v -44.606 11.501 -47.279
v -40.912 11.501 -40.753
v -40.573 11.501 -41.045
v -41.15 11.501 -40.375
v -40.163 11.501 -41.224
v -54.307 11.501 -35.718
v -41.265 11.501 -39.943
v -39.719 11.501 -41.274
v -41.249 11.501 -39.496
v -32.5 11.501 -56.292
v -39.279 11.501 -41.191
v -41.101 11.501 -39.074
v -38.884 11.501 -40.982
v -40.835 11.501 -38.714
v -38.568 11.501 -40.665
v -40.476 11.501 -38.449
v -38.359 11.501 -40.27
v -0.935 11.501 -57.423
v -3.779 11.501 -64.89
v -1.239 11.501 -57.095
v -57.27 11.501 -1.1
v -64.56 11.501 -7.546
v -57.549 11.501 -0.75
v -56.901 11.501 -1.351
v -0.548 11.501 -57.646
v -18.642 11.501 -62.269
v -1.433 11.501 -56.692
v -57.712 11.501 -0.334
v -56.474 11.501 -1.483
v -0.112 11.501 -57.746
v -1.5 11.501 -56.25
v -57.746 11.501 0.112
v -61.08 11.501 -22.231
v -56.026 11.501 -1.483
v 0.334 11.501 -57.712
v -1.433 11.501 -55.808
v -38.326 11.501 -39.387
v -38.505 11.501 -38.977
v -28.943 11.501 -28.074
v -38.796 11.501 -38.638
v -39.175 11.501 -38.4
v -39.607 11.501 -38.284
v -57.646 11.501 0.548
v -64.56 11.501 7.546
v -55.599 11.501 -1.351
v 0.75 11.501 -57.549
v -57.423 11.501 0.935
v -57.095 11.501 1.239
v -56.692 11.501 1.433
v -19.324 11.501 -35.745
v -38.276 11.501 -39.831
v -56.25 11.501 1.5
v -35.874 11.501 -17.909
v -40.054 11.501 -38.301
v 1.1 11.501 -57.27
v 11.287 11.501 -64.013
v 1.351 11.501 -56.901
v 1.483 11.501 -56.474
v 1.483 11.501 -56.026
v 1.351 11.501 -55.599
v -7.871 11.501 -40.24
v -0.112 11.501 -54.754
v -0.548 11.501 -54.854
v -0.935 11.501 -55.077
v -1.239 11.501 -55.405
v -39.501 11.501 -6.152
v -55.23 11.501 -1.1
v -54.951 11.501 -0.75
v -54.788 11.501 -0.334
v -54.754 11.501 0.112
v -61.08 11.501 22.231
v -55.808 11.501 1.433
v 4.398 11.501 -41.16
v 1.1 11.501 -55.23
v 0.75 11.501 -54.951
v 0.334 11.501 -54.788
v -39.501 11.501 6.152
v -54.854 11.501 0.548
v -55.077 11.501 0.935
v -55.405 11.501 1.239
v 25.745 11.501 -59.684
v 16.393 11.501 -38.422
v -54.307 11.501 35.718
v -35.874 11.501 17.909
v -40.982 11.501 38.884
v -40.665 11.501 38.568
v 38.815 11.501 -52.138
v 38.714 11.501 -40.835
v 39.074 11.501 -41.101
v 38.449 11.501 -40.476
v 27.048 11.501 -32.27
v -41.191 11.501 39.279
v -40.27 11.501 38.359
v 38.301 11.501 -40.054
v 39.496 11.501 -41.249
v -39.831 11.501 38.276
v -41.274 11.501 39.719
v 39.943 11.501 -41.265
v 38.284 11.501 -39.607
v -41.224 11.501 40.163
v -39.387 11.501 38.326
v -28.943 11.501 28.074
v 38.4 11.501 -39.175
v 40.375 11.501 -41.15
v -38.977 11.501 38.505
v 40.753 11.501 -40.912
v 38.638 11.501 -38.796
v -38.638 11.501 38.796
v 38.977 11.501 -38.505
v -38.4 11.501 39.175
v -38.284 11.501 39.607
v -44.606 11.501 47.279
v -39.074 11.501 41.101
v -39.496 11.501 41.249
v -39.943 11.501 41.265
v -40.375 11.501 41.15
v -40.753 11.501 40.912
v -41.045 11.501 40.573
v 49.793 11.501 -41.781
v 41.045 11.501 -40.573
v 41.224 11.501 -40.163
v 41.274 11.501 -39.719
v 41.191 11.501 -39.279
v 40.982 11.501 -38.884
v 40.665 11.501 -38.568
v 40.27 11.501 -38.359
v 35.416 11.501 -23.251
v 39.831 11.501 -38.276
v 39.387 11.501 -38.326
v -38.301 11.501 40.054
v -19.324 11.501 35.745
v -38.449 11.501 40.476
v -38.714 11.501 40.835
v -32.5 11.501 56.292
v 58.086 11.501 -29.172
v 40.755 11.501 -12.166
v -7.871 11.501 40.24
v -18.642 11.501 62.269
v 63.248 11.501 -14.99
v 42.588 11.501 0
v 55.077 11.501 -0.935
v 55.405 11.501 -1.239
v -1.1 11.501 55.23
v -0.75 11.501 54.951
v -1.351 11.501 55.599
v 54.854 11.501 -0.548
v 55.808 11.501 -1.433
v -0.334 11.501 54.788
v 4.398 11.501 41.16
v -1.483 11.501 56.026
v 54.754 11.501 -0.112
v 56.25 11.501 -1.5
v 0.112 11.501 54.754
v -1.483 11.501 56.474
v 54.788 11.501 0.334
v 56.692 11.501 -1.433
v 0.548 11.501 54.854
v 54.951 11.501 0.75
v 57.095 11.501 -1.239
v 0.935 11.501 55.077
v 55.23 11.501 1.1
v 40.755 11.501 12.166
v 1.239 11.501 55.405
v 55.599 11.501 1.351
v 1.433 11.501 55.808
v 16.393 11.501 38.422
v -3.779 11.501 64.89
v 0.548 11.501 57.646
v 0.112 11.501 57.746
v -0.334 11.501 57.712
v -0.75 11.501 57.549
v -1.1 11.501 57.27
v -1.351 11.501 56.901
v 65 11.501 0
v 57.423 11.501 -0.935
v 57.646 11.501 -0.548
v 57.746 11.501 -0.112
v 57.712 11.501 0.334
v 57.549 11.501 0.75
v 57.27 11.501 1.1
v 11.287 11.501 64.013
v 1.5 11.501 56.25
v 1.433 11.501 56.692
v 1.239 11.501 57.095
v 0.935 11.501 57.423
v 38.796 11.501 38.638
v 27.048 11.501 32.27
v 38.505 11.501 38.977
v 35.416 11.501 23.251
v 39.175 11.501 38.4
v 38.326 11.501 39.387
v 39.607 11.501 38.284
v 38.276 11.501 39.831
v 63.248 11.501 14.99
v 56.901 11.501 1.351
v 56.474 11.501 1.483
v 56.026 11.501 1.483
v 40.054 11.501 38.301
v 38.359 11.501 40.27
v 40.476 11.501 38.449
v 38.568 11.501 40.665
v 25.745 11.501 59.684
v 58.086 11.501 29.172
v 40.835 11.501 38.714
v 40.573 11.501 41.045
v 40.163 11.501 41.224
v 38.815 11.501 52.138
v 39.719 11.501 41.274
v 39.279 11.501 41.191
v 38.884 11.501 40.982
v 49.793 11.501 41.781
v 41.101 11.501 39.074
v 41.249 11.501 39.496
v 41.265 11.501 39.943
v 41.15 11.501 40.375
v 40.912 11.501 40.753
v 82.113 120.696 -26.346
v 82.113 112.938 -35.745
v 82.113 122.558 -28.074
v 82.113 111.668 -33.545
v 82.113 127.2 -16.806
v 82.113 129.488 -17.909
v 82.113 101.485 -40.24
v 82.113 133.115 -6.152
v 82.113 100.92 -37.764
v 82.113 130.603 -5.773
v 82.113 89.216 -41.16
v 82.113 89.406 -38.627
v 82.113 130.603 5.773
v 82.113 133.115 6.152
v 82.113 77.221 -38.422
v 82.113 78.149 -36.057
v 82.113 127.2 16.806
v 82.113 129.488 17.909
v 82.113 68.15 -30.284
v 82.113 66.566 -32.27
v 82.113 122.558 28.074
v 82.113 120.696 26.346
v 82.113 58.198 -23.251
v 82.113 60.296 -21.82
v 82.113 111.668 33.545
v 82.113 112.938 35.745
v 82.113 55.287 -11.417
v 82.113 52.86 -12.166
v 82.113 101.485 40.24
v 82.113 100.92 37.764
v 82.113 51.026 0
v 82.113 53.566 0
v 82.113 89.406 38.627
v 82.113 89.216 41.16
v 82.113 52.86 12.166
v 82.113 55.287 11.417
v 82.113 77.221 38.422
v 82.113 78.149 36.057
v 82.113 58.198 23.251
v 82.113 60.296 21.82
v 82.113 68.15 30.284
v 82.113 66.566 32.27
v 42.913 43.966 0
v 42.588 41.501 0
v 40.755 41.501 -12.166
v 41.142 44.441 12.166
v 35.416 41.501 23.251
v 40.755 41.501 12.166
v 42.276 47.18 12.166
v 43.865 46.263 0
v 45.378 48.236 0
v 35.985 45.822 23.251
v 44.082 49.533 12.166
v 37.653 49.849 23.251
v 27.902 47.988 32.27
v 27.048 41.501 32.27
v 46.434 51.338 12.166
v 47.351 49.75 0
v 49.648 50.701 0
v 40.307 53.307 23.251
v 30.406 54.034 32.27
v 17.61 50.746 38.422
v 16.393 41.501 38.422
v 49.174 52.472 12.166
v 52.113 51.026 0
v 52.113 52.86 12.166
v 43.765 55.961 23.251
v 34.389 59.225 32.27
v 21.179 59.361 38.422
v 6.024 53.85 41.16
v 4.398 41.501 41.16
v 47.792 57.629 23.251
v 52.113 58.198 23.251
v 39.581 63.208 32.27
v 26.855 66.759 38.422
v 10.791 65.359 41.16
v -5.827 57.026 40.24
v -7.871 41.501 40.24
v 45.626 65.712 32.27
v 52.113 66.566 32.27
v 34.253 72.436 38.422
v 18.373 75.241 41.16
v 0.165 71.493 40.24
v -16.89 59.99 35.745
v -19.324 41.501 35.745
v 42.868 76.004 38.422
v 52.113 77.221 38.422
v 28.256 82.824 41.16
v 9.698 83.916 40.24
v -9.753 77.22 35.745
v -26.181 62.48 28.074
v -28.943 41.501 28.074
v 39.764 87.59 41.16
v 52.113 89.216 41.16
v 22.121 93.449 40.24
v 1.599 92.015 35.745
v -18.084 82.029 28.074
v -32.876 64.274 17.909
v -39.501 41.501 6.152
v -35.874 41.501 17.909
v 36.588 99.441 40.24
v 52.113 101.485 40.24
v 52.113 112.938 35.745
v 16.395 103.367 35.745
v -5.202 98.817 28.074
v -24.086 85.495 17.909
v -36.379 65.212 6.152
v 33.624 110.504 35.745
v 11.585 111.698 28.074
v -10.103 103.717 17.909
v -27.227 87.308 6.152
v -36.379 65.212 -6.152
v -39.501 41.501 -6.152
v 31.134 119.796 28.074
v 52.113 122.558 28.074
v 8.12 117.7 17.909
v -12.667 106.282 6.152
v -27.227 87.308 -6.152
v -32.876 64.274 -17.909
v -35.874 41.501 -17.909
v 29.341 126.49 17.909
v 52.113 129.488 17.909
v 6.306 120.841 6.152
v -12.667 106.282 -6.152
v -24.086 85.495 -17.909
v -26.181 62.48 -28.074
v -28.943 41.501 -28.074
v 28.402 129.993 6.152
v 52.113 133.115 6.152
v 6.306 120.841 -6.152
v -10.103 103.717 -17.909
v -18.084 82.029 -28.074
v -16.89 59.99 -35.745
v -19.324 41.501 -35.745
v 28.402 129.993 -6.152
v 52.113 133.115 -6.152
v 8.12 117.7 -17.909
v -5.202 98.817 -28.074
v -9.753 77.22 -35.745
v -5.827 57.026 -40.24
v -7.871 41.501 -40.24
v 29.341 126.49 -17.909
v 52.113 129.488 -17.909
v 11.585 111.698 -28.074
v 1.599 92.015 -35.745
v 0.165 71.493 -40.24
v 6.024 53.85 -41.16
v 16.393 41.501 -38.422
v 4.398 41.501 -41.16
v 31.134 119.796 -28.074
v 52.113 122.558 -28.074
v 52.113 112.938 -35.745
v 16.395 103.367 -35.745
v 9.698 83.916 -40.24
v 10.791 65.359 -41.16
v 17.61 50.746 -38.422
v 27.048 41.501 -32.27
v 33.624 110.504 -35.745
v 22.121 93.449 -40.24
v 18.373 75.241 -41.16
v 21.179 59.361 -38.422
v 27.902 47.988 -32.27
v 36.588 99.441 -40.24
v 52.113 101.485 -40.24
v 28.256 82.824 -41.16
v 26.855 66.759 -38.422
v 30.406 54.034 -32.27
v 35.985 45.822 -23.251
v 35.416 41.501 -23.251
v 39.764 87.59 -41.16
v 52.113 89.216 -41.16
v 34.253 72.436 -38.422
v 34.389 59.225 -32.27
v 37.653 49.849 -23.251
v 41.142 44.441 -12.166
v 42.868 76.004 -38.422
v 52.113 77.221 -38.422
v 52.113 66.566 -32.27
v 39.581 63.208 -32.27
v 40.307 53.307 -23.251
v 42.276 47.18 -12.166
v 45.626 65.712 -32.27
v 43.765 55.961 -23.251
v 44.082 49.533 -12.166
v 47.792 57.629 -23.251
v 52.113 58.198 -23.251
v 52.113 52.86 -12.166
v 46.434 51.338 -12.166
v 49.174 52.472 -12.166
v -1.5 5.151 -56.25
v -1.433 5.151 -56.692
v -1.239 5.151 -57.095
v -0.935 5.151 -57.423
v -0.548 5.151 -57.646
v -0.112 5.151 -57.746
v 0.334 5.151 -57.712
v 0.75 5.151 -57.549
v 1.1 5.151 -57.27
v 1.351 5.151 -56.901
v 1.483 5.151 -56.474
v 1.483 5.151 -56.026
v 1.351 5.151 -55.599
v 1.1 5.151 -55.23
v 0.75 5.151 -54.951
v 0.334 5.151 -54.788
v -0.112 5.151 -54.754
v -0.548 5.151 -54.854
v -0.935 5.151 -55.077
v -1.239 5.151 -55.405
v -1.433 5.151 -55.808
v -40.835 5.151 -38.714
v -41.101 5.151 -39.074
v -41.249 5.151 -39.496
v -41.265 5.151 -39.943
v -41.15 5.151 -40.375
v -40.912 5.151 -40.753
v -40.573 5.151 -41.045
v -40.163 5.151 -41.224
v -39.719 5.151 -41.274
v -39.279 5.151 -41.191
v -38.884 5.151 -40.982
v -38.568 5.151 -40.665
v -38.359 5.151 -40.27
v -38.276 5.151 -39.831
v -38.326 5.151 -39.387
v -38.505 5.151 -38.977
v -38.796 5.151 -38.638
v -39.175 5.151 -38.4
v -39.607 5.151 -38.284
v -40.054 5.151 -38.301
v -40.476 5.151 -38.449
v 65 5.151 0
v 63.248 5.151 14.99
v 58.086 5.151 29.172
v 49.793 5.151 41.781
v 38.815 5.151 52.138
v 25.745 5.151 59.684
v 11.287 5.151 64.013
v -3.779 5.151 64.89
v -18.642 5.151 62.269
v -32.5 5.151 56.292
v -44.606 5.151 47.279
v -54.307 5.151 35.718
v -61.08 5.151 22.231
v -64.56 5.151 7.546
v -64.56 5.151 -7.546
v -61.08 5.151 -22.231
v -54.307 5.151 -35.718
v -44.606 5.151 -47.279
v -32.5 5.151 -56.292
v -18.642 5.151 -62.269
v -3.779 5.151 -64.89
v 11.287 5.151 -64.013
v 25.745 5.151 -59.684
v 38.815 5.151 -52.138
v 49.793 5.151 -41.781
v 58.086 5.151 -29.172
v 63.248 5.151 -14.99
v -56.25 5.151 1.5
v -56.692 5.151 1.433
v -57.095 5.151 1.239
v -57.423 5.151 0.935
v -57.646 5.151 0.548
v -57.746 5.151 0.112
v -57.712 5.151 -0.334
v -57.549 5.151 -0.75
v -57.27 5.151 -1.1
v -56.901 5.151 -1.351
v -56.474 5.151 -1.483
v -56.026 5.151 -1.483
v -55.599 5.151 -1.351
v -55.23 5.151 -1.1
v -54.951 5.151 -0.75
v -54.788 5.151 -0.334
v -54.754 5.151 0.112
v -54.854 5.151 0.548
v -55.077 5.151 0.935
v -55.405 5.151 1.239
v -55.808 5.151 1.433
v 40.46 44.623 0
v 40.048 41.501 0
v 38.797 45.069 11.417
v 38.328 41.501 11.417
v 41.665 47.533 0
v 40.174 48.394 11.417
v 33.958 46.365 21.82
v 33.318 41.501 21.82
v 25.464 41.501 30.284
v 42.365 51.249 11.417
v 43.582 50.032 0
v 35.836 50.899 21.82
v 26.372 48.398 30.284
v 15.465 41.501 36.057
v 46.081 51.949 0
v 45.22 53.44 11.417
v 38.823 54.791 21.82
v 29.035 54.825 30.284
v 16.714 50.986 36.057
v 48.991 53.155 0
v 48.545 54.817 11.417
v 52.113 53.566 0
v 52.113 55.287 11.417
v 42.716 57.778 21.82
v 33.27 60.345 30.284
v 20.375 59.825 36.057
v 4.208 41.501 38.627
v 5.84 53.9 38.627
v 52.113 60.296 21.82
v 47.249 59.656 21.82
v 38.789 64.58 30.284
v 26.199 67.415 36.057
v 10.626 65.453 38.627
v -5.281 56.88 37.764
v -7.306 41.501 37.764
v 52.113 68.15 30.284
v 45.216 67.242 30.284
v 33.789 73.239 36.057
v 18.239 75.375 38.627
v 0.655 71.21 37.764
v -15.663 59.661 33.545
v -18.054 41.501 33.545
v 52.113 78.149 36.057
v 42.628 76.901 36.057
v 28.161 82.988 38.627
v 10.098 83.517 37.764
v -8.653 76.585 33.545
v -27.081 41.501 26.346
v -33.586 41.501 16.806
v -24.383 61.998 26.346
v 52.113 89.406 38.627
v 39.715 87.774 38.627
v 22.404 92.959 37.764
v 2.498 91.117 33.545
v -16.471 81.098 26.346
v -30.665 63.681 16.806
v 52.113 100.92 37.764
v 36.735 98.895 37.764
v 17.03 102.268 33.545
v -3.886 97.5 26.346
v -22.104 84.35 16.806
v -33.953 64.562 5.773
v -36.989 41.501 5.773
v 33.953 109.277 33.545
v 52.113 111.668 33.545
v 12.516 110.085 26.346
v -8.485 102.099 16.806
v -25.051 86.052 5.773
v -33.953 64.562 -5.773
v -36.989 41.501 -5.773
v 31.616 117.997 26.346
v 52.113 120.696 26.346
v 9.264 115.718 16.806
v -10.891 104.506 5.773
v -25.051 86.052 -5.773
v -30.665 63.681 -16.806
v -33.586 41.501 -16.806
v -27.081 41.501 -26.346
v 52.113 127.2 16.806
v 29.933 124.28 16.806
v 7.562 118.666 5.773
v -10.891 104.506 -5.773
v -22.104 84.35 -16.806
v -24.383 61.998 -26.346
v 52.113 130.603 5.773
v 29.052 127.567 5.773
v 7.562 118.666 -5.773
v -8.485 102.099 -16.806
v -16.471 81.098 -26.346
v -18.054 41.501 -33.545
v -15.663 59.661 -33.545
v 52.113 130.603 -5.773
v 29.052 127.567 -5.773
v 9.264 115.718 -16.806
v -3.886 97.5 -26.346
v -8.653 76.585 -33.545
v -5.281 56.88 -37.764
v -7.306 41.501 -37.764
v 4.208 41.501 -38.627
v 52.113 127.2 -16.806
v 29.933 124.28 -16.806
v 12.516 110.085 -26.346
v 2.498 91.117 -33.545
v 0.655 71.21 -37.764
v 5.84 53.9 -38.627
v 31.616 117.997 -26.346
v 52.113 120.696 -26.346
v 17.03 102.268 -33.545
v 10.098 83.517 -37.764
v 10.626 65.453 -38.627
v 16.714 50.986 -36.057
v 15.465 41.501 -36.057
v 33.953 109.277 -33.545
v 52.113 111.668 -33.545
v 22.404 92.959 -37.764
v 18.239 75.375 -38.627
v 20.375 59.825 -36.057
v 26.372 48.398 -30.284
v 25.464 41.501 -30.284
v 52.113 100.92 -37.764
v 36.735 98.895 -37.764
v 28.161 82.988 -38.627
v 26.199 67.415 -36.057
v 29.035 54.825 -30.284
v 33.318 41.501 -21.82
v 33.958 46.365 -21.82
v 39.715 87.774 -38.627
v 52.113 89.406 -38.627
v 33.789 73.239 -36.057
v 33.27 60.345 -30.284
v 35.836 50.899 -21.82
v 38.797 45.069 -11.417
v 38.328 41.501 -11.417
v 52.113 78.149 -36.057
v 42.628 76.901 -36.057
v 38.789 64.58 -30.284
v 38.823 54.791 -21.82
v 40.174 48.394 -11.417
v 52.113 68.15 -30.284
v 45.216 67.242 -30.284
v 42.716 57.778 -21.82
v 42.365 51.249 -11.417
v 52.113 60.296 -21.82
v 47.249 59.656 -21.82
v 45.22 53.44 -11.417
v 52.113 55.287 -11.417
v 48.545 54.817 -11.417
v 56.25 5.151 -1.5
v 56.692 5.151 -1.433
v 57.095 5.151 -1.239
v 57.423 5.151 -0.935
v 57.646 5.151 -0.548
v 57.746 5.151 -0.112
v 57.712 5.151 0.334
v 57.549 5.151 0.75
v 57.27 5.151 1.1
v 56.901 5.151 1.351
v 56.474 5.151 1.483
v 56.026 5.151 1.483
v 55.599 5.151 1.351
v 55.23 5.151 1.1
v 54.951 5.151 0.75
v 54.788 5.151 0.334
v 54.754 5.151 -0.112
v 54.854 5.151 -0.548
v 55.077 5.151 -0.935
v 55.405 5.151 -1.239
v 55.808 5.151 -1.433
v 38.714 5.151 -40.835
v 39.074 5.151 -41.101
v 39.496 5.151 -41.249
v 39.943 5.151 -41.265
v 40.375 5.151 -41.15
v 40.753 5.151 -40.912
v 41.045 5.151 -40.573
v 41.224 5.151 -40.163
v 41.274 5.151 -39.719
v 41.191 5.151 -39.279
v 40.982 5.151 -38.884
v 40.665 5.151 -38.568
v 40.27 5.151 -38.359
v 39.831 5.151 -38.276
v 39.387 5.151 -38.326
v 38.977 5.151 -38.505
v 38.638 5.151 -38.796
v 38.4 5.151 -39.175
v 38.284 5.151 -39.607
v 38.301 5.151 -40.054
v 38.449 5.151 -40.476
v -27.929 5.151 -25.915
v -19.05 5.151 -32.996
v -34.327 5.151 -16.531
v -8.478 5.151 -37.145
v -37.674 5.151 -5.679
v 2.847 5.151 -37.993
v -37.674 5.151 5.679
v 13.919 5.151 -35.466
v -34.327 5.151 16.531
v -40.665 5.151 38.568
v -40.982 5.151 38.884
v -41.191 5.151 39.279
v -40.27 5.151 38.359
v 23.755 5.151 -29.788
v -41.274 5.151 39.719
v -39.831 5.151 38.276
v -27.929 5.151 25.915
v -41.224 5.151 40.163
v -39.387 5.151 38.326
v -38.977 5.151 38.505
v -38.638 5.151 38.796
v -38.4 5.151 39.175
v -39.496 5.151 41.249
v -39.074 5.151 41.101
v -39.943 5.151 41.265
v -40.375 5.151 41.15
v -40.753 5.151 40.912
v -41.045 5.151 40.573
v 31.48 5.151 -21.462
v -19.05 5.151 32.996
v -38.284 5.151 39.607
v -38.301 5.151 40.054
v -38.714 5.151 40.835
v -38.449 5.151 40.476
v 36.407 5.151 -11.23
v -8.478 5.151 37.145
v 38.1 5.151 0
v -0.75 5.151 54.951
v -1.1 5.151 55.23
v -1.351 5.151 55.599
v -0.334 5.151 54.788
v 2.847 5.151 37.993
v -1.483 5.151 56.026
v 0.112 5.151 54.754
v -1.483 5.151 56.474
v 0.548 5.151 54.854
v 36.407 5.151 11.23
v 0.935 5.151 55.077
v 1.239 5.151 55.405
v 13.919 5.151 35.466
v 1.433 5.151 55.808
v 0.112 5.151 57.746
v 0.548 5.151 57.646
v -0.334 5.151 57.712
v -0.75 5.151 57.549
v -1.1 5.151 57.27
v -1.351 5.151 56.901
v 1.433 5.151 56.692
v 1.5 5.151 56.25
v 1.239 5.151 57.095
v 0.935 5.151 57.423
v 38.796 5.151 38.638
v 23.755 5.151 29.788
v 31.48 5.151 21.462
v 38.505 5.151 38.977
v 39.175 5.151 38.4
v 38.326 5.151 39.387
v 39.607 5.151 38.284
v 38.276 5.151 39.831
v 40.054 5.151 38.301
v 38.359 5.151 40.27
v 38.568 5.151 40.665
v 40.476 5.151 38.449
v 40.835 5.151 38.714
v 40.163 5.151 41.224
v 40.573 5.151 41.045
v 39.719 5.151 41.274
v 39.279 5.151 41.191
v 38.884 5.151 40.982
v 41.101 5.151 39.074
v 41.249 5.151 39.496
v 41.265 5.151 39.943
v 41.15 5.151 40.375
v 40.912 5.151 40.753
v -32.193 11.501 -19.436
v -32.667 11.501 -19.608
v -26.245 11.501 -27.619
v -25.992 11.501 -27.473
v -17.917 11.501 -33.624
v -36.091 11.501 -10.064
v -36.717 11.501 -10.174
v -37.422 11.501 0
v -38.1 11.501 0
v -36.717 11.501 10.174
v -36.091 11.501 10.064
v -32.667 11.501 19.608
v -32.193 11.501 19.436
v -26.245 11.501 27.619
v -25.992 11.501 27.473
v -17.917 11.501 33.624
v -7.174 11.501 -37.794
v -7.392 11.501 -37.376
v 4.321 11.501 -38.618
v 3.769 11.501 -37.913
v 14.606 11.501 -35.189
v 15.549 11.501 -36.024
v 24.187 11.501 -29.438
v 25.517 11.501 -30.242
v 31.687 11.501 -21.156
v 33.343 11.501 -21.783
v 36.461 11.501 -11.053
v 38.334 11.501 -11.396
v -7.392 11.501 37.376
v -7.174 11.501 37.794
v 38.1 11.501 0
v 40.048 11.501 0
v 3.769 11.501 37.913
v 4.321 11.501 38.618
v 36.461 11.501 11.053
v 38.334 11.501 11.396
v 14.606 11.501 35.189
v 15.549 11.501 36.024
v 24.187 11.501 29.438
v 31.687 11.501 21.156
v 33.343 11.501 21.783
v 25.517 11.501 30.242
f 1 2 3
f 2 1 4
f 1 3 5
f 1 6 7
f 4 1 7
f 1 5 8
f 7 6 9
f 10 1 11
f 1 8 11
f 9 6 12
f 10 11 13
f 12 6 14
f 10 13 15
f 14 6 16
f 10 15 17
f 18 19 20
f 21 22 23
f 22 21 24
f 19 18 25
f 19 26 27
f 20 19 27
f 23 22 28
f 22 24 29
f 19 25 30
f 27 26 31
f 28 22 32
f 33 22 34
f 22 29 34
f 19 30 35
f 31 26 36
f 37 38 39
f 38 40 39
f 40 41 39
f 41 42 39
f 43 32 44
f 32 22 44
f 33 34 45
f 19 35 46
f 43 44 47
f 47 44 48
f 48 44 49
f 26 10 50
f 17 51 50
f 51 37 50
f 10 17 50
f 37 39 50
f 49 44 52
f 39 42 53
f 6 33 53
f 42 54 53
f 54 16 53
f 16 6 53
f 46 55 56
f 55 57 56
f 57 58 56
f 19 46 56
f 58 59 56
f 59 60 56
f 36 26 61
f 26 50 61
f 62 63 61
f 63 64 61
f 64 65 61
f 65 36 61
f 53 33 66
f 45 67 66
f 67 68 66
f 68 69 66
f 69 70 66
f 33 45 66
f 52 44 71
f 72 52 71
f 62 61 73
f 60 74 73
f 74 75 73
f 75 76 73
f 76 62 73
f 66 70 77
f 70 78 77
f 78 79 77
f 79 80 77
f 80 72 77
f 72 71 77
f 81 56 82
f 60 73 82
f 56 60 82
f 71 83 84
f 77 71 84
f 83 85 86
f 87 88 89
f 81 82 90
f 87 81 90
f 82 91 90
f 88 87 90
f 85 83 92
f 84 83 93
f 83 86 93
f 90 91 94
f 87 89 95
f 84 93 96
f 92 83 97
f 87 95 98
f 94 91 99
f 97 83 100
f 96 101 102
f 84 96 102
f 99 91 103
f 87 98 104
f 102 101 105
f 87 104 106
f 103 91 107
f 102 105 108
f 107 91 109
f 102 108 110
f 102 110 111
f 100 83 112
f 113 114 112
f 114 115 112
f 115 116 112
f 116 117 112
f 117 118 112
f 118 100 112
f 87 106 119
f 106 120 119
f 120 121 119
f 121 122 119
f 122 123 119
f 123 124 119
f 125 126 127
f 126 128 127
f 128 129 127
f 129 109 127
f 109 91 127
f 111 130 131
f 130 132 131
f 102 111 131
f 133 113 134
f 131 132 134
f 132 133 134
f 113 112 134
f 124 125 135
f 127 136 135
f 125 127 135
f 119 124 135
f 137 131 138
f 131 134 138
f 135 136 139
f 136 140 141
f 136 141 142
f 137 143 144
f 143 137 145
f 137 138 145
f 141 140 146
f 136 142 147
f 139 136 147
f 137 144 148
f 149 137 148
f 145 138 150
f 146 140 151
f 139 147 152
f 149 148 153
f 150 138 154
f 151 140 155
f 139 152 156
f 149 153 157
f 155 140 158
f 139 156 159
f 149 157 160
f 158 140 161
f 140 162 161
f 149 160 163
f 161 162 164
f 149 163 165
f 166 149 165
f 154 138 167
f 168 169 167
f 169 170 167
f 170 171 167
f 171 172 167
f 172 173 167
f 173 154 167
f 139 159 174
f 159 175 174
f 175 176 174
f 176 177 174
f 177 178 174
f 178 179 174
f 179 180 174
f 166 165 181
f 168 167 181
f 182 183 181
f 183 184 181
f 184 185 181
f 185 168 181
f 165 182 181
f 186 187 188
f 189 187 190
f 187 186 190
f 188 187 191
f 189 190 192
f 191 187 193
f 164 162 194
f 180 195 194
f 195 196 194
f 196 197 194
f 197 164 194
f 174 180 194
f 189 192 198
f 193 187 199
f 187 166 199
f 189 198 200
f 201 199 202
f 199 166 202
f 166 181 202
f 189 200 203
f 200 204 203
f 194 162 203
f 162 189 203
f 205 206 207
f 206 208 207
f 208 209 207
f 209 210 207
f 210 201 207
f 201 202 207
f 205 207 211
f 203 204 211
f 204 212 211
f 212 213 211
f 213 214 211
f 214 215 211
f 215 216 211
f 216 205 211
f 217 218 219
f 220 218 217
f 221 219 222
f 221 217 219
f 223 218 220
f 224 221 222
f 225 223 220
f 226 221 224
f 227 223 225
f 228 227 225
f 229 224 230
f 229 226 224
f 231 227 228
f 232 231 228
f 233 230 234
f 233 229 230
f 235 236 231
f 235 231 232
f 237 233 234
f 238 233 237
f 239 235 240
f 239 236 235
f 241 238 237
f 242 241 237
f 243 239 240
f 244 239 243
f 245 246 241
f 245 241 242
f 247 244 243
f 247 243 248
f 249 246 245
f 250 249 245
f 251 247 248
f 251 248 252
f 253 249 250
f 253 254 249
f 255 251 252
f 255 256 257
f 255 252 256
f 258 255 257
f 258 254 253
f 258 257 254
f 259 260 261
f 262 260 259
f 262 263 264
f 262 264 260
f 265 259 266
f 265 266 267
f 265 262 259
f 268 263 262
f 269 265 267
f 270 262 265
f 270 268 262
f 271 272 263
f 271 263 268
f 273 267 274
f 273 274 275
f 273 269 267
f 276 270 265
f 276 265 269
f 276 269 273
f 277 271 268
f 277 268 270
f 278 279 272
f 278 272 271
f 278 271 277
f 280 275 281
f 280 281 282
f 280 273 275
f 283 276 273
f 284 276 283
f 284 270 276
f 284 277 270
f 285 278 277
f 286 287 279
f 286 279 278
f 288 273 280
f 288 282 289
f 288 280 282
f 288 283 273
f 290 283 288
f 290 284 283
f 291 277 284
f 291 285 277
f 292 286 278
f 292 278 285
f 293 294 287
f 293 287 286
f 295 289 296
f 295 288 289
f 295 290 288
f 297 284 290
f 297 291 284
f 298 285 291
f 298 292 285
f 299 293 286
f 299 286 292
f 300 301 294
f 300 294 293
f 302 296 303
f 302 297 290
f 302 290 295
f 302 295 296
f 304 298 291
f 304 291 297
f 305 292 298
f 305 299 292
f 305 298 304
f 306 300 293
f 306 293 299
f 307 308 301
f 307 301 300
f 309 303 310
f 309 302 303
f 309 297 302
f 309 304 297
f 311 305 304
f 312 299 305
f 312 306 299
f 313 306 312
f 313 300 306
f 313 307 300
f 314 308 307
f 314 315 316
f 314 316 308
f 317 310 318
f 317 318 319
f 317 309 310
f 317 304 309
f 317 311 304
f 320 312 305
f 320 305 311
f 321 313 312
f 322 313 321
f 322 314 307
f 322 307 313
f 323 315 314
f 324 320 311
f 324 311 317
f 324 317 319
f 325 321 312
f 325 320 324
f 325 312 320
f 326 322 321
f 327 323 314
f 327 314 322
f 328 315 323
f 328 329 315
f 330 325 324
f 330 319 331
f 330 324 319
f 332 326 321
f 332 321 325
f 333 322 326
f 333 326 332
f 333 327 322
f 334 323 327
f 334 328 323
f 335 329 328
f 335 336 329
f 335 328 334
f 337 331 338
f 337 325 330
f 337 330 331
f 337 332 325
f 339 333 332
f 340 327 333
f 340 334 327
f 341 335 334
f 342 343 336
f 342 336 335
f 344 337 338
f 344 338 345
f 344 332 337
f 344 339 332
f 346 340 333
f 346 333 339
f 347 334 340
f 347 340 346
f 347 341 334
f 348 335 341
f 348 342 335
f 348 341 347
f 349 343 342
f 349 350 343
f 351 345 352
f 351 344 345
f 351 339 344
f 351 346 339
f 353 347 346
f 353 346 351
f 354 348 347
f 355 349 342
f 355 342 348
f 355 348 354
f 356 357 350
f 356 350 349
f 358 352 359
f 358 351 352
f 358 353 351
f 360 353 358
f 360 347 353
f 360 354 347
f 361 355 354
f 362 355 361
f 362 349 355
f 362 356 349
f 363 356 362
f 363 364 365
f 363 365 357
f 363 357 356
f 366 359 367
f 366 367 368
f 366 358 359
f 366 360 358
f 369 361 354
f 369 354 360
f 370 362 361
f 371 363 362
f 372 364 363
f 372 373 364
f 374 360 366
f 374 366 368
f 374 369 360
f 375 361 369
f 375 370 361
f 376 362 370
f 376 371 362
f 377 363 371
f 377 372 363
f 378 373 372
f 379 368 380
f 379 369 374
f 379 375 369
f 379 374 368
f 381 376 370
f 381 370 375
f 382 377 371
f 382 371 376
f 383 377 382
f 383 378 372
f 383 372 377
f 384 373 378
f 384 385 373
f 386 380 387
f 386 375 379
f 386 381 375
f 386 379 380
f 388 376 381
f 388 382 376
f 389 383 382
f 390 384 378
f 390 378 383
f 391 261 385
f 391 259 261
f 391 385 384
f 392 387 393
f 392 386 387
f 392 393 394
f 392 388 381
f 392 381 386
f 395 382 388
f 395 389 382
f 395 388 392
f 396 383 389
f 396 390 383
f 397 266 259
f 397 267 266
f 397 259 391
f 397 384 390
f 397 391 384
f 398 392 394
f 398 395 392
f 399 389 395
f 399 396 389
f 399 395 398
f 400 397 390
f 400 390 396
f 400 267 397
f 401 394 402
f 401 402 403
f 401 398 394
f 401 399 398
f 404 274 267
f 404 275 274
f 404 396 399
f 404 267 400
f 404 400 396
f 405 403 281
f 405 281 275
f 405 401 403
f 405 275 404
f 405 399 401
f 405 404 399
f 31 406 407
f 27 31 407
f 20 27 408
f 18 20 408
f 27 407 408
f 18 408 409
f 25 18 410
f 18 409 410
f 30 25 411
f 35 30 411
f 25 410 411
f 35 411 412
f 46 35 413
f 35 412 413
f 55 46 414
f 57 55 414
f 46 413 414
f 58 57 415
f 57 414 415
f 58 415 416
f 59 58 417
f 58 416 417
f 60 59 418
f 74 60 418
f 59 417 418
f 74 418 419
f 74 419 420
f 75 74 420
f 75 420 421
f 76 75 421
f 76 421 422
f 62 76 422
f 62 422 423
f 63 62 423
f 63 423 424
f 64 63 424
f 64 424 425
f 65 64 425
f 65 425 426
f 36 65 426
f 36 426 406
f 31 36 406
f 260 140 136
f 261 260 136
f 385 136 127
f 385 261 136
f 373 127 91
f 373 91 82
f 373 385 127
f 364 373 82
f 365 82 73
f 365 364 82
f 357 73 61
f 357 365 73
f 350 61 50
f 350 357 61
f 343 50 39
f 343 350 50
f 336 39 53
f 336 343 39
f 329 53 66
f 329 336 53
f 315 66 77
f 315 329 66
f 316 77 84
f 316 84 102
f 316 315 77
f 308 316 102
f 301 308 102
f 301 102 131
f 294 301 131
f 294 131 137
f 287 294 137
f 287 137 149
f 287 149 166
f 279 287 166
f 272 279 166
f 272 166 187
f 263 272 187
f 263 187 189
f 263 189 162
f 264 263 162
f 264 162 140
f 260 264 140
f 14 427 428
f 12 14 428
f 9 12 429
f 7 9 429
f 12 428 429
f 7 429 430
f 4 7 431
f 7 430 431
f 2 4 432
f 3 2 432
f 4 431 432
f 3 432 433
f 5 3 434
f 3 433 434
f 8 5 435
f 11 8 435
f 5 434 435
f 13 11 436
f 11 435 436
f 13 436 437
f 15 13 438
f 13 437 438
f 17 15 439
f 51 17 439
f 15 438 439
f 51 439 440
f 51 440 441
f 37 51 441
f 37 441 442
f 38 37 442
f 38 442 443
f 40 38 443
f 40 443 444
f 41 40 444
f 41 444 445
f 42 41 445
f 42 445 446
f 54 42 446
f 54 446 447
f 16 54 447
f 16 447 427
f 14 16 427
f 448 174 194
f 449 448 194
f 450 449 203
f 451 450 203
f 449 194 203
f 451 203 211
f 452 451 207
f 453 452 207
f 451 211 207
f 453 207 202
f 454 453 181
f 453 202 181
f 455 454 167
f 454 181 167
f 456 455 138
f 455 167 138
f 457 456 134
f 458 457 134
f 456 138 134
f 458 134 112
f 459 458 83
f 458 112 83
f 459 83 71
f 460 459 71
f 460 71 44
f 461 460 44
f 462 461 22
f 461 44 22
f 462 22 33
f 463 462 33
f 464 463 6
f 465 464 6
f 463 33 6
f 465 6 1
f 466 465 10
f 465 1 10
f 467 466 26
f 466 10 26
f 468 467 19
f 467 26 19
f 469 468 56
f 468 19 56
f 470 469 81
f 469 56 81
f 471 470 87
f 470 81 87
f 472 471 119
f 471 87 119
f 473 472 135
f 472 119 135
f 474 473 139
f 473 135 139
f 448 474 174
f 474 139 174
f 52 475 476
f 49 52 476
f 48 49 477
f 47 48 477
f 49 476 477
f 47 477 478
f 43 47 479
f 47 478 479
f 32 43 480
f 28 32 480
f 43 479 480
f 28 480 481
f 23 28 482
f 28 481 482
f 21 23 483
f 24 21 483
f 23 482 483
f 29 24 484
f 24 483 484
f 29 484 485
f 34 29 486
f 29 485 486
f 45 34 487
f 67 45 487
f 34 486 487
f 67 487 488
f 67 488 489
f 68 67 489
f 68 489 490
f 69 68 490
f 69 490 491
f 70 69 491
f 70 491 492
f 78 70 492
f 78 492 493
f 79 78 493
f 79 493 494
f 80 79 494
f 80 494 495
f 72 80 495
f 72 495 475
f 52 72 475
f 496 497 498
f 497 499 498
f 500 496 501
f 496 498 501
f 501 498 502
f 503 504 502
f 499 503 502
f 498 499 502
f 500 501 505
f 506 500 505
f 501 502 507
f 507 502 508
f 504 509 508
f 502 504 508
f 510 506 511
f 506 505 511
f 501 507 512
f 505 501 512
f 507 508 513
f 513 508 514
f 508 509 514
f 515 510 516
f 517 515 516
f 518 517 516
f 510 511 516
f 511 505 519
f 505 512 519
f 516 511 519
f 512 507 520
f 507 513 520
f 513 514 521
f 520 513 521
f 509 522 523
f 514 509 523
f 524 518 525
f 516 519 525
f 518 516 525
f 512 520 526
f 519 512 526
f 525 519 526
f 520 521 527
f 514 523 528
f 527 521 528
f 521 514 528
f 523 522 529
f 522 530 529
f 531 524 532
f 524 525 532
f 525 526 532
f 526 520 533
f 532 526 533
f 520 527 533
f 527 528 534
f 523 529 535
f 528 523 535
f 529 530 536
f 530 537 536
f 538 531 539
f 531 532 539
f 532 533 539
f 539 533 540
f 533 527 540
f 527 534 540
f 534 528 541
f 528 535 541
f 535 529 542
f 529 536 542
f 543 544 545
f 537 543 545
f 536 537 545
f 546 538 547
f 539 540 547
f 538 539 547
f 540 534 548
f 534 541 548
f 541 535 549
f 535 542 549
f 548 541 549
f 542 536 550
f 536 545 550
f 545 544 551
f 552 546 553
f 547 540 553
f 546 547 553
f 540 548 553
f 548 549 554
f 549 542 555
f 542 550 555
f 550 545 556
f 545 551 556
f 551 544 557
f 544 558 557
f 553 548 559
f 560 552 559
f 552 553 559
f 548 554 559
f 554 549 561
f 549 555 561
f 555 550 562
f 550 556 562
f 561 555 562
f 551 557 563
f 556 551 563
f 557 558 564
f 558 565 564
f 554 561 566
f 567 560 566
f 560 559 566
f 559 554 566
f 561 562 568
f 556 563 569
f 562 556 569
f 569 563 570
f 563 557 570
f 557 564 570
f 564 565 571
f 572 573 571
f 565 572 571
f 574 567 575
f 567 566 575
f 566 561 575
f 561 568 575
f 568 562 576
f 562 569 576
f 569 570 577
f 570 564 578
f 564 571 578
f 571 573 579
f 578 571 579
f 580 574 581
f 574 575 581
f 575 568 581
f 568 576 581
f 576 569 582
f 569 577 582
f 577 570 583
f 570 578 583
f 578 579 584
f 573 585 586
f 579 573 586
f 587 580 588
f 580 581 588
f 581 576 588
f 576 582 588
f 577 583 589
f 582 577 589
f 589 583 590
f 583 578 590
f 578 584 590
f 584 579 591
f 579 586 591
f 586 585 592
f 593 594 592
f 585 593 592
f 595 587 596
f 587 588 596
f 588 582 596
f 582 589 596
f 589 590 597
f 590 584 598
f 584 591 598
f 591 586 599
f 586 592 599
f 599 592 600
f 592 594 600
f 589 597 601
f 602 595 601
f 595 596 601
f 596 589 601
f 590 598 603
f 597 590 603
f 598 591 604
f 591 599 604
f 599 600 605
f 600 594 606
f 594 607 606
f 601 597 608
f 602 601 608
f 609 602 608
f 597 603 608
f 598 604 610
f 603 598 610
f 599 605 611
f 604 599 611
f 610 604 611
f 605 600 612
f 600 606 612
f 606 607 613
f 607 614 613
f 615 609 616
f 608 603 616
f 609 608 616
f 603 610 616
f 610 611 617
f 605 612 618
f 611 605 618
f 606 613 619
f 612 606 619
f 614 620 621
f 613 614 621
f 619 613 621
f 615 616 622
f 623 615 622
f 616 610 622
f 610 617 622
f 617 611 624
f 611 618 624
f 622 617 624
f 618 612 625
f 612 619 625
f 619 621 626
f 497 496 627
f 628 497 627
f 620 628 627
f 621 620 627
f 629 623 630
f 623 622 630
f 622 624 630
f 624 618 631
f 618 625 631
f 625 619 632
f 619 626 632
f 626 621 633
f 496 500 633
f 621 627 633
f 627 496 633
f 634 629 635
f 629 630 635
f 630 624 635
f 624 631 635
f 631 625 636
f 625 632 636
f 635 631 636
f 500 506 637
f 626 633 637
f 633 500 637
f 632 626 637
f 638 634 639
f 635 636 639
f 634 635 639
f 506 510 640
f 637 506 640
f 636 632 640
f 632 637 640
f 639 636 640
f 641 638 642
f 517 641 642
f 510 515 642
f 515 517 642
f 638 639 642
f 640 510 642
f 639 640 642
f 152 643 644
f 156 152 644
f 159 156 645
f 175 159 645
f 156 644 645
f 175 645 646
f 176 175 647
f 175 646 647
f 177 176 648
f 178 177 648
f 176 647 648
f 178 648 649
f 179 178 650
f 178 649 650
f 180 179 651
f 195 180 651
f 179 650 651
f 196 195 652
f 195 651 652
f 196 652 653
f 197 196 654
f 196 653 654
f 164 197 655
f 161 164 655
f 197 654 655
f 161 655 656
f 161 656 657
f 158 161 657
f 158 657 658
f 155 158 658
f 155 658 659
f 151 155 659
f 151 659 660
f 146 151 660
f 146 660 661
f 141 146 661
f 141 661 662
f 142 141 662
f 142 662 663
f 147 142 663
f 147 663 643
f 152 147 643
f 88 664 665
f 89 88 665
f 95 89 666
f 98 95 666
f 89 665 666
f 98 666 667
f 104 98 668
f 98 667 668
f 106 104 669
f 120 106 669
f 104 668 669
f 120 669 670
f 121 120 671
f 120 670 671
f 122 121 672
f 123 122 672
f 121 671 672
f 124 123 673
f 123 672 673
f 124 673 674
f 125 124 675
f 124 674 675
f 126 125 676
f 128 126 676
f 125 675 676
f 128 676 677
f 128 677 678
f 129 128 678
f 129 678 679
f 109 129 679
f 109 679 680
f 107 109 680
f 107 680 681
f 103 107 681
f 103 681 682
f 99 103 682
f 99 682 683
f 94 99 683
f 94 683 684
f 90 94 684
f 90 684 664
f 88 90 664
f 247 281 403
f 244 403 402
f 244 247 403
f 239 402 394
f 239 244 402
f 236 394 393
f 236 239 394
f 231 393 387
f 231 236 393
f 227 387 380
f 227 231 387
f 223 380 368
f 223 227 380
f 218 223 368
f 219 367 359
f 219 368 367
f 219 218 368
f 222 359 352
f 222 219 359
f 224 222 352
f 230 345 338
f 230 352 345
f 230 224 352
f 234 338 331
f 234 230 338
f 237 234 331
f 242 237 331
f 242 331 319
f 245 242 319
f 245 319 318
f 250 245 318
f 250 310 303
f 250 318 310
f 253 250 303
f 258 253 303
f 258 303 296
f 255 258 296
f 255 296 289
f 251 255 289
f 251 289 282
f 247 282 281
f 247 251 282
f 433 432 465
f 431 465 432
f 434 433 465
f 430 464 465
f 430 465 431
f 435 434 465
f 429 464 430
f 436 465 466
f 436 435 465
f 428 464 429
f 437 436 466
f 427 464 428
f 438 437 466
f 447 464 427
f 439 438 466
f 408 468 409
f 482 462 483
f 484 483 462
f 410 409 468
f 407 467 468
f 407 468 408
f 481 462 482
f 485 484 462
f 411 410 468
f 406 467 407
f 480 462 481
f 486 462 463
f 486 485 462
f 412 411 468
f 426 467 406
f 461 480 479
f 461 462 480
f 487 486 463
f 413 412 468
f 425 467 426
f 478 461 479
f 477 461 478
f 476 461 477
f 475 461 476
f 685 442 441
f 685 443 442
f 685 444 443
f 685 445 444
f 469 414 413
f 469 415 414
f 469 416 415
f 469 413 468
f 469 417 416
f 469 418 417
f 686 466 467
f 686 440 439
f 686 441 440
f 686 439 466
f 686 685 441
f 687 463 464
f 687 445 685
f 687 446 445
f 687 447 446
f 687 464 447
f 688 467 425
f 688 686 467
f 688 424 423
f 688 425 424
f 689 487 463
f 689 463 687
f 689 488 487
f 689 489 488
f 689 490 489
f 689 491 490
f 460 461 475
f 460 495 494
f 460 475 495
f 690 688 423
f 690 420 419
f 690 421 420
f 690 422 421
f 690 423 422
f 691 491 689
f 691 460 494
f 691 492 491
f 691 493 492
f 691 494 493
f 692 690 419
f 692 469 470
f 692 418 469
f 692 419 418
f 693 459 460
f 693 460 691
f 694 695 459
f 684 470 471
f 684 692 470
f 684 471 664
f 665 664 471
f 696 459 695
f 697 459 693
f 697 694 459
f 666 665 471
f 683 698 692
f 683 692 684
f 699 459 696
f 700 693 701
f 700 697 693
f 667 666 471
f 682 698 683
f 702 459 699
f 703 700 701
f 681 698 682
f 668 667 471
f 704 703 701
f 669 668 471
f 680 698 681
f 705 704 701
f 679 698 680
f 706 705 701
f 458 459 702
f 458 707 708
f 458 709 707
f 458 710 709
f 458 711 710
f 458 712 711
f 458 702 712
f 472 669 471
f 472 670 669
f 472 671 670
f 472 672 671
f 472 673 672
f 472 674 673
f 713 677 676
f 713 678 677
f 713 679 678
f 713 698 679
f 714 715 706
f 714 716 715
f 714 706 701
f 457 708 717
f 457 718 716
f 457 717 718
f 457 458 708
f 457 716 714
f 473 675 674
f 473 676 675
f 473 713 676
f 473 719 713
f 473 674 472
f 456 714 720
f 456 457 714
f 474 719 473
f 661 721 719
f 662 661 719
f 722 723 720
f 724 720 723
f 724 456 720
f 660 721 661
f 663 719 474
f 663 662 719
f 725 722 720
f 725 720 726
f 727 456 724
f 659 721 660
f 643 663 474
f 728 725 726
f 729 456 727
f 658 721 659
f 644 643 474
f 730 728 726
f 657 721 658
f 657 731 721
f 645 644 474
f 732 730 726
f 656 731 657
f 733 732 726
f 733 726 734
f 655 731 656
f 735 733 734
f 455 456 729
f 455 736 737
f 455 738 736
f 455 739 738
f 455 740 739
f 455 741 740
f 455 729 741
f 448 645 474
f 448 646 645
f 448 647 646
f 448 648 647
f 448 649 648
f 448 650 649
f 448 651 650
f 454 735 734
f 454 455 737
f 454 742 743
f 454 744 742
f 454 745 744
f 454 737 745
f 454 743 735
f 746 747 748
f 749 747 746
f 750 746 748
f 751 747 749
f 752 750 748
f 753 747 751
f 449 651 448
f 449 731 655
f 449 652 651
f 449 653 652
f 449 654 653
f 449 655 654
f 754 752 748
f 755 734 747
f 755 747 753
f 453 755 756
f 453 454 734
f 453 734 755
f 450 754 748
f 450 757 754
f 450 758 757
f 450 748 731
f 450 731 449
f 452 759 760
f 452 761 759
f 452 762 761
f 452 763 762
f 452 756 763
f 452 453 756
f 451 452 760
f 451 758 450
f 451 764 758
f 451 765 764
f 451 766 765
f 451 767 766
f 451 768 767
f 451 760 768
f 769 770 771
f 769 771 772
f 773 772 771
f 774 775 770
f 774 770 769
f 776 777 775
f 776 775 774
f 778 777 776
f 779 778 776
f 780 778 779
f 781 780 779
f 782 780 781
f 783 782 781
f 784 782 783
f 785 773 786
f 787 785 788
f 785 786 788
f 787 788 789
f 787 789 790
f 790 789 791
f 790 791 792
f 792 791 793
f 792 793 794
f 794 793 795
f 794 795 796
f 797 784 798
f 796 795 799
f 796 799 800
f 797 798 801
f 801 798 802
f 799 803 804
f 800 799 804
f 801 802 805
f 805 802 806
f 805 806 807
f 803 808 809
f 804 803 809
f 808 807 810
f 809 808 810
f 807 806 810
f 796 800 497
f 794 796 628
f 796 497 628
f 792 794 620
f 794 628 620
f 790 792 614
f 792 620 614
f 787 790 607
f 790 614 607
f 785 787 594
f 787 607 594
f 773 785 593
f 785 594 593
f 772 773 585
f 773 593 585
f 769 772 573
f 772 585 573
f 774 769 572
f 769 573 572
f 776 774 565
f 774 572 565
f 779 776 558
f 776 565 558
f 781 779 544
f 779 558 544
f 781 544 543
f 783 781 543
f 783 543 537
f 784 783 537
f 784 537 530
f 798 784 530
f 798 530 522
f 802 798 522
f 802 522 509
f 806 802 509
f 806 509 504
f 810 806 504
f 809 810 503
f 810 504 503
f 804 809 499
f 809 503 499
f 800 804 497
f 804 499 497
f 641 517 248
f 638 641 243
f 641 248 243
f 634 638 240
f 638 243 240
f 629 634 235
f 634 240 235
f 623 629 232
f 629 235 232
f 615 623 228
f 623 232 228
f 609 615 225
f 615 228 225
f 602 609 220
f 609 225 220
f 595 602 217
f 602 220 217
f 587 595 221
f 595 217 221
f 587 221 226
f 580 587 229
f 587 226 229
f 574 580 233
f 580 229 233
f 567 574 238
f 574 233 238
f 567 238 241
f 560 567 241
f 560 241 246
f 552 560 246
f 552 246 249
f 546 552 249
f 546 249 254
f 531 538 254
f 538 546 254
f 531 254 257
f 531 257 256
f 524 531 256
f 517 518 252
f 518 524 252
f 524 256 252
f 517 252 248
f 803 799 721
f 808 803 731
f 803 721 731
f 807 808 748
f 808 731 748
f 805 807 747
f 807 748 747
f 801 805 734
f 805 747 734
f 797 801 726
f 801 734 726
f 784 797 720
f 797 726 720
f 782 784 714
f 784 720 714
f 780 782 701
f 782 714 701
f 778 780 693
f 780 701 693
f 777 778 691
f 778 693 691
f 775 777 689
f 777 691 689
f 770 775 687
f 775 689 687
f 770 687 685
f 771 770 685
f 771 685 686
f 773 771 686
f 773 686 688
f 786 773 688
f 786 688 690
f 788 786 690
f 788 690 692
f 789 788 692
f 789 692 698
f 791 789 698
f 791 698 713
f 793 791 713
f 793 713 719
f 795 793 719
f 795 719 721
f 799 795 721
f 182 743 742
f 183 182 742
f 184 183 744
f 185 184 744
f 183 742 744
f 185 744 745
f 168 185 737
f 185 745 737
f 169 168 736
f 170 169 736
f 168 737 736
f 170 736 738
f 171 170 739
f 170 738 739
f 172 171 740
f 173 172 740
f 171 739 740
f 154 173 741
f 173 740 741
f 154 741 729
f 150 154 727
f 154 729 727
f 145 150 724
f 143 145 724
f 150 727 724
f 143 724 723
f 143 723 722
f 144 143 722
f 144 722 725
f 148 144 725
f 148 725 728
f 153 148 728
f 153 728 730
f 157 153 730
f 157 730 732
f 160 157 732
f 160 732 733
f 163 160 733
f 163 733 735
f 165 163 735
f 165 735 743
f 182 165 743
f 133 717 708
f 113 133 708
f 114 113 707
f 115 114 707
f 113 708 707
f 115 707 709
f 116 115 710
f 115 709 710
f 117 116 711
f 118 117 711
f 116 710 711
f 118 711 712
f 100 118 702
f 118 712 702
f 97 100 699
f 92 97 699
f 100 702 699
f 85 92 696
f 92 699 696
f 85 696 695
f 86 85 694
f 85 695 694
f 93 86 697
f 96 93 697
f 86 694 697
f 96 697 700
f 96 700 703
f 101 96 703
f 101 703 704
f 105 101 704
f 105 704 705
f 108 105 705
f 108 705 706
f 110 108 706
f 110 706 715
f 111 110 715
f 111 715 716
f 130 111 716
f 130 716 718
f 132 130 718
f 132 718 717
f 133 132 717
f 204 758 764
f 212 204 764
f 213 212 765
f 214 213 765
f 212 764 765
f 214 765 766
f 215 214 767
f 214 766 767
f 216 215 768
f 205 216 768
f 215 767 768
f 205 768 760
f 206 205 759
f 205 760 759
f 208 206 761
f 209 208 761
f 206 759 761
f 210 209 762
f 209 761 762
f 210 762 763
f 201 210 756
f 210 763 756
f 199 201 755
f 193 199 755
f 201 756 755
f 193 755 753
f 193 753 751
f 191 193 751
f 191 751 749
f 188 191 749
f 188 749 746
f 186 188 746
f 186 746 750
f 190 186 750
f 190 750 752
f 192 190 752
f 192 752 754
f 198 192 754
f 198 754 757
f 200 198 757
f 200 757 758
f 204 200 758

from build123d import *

# Parameters (mm, degrees)
SWEEP5_PROFILE_R    = 41.275
SHELL13_T           = -2.54
SKETCH19_R          = 65
BOSS_EXTRUDE1_DEPTH = 6.35
SKETCH20_R          = 38.1
CUT_EXTRUDE1_DEPTH  = 6.35
SKETCH28_R          = 1.5
CUT_EXTRUDE5_DEPTH  = 10
CIRPATTERN1_COUNT   = 8


with BuildPart() as part:
    # Sweep5: sweep along a path in Sketch4
    with BuildLine(Plane.XY) as sweep5_path:
        Line((1.313416864, 11.5007856), (1.313416864, 41.5007856))
        ThreePointArc((1.313416864, 41.5007856), (16.19239238, 77.421810084), (52.113416864, 92.3007856))
        Line((52.113416864, 92.3007856), (82.113416864, 92.3007856))
    # Sweep5 profile (on start of the path) → Sweep5 (sweep)
    with BuildSketch(Plane(origin=(1.313416864, 11.5007856, 0), x_dir=(1, 0, 0), z_dir=(0, 1, 0))):
        Circle(SWEEP5_PROFILE_R)
    sweep(path=sweep5_path.line)

    # Shell13
    shell13_openings = [part.faces().sort_by_distance(p)[0] for p in [
        (82.113416864, 92.3007856, 0),
        (1.313416864, 11.5007856, 0),
    ]]
    offset(amount=SHELL13_T, openings=shell13_openings, kind=Kind.INTERSECTION)

    # Sketch19 → Boss-Extrude1 (add)
    with BuildSketch(Plane.XZ.offset(-11.5007856)):
        Circle(SKETCH19_R)
    extrude(amount=BOSS_EXTRUDE1_DEPTH)

    # Sketch20 → Cut-Extrude1 (cut)
    with BuildSketch(Plane(origin=(0, 5.1507856, 0), x_dir=(-1, 0, 0), z_dir=(0, -1, 0))):
        with Locations(Location((0, 0, 0), (0, 0, 180))):
            Circle(SKETCH20_R)
    extrude(amount=-CUT_EXTRUDE1_DEPTH, mode=Mode.SUBTRACT)

    # Sketch28 → Cut-Extrude5 (cut)
    with BuildSketch(Plane.XZ.offset(-5.1507856)):
        with Locations((0, 56.25)):
            Circle(SKETCH28_R)
    cut_extrude5 = extrude(amount=-CUT_EXTRUDE5_DEPTH, mode=Mode.SUBTRACT)

    # CirPattern1: Cut-Extrude5 ×8 about axis
    cirpattern1_axis = Axis((0, 0, 0), (0, 1, 0))
    for i in range(1, CIRPATTERN1_COUNT):
        add(cut_extrude5.rotate(cirpattern1_axis, i * 360 / CIRPATTERN1_COUNT), mode=Mode.SUBTRACT)


solid = part.part
